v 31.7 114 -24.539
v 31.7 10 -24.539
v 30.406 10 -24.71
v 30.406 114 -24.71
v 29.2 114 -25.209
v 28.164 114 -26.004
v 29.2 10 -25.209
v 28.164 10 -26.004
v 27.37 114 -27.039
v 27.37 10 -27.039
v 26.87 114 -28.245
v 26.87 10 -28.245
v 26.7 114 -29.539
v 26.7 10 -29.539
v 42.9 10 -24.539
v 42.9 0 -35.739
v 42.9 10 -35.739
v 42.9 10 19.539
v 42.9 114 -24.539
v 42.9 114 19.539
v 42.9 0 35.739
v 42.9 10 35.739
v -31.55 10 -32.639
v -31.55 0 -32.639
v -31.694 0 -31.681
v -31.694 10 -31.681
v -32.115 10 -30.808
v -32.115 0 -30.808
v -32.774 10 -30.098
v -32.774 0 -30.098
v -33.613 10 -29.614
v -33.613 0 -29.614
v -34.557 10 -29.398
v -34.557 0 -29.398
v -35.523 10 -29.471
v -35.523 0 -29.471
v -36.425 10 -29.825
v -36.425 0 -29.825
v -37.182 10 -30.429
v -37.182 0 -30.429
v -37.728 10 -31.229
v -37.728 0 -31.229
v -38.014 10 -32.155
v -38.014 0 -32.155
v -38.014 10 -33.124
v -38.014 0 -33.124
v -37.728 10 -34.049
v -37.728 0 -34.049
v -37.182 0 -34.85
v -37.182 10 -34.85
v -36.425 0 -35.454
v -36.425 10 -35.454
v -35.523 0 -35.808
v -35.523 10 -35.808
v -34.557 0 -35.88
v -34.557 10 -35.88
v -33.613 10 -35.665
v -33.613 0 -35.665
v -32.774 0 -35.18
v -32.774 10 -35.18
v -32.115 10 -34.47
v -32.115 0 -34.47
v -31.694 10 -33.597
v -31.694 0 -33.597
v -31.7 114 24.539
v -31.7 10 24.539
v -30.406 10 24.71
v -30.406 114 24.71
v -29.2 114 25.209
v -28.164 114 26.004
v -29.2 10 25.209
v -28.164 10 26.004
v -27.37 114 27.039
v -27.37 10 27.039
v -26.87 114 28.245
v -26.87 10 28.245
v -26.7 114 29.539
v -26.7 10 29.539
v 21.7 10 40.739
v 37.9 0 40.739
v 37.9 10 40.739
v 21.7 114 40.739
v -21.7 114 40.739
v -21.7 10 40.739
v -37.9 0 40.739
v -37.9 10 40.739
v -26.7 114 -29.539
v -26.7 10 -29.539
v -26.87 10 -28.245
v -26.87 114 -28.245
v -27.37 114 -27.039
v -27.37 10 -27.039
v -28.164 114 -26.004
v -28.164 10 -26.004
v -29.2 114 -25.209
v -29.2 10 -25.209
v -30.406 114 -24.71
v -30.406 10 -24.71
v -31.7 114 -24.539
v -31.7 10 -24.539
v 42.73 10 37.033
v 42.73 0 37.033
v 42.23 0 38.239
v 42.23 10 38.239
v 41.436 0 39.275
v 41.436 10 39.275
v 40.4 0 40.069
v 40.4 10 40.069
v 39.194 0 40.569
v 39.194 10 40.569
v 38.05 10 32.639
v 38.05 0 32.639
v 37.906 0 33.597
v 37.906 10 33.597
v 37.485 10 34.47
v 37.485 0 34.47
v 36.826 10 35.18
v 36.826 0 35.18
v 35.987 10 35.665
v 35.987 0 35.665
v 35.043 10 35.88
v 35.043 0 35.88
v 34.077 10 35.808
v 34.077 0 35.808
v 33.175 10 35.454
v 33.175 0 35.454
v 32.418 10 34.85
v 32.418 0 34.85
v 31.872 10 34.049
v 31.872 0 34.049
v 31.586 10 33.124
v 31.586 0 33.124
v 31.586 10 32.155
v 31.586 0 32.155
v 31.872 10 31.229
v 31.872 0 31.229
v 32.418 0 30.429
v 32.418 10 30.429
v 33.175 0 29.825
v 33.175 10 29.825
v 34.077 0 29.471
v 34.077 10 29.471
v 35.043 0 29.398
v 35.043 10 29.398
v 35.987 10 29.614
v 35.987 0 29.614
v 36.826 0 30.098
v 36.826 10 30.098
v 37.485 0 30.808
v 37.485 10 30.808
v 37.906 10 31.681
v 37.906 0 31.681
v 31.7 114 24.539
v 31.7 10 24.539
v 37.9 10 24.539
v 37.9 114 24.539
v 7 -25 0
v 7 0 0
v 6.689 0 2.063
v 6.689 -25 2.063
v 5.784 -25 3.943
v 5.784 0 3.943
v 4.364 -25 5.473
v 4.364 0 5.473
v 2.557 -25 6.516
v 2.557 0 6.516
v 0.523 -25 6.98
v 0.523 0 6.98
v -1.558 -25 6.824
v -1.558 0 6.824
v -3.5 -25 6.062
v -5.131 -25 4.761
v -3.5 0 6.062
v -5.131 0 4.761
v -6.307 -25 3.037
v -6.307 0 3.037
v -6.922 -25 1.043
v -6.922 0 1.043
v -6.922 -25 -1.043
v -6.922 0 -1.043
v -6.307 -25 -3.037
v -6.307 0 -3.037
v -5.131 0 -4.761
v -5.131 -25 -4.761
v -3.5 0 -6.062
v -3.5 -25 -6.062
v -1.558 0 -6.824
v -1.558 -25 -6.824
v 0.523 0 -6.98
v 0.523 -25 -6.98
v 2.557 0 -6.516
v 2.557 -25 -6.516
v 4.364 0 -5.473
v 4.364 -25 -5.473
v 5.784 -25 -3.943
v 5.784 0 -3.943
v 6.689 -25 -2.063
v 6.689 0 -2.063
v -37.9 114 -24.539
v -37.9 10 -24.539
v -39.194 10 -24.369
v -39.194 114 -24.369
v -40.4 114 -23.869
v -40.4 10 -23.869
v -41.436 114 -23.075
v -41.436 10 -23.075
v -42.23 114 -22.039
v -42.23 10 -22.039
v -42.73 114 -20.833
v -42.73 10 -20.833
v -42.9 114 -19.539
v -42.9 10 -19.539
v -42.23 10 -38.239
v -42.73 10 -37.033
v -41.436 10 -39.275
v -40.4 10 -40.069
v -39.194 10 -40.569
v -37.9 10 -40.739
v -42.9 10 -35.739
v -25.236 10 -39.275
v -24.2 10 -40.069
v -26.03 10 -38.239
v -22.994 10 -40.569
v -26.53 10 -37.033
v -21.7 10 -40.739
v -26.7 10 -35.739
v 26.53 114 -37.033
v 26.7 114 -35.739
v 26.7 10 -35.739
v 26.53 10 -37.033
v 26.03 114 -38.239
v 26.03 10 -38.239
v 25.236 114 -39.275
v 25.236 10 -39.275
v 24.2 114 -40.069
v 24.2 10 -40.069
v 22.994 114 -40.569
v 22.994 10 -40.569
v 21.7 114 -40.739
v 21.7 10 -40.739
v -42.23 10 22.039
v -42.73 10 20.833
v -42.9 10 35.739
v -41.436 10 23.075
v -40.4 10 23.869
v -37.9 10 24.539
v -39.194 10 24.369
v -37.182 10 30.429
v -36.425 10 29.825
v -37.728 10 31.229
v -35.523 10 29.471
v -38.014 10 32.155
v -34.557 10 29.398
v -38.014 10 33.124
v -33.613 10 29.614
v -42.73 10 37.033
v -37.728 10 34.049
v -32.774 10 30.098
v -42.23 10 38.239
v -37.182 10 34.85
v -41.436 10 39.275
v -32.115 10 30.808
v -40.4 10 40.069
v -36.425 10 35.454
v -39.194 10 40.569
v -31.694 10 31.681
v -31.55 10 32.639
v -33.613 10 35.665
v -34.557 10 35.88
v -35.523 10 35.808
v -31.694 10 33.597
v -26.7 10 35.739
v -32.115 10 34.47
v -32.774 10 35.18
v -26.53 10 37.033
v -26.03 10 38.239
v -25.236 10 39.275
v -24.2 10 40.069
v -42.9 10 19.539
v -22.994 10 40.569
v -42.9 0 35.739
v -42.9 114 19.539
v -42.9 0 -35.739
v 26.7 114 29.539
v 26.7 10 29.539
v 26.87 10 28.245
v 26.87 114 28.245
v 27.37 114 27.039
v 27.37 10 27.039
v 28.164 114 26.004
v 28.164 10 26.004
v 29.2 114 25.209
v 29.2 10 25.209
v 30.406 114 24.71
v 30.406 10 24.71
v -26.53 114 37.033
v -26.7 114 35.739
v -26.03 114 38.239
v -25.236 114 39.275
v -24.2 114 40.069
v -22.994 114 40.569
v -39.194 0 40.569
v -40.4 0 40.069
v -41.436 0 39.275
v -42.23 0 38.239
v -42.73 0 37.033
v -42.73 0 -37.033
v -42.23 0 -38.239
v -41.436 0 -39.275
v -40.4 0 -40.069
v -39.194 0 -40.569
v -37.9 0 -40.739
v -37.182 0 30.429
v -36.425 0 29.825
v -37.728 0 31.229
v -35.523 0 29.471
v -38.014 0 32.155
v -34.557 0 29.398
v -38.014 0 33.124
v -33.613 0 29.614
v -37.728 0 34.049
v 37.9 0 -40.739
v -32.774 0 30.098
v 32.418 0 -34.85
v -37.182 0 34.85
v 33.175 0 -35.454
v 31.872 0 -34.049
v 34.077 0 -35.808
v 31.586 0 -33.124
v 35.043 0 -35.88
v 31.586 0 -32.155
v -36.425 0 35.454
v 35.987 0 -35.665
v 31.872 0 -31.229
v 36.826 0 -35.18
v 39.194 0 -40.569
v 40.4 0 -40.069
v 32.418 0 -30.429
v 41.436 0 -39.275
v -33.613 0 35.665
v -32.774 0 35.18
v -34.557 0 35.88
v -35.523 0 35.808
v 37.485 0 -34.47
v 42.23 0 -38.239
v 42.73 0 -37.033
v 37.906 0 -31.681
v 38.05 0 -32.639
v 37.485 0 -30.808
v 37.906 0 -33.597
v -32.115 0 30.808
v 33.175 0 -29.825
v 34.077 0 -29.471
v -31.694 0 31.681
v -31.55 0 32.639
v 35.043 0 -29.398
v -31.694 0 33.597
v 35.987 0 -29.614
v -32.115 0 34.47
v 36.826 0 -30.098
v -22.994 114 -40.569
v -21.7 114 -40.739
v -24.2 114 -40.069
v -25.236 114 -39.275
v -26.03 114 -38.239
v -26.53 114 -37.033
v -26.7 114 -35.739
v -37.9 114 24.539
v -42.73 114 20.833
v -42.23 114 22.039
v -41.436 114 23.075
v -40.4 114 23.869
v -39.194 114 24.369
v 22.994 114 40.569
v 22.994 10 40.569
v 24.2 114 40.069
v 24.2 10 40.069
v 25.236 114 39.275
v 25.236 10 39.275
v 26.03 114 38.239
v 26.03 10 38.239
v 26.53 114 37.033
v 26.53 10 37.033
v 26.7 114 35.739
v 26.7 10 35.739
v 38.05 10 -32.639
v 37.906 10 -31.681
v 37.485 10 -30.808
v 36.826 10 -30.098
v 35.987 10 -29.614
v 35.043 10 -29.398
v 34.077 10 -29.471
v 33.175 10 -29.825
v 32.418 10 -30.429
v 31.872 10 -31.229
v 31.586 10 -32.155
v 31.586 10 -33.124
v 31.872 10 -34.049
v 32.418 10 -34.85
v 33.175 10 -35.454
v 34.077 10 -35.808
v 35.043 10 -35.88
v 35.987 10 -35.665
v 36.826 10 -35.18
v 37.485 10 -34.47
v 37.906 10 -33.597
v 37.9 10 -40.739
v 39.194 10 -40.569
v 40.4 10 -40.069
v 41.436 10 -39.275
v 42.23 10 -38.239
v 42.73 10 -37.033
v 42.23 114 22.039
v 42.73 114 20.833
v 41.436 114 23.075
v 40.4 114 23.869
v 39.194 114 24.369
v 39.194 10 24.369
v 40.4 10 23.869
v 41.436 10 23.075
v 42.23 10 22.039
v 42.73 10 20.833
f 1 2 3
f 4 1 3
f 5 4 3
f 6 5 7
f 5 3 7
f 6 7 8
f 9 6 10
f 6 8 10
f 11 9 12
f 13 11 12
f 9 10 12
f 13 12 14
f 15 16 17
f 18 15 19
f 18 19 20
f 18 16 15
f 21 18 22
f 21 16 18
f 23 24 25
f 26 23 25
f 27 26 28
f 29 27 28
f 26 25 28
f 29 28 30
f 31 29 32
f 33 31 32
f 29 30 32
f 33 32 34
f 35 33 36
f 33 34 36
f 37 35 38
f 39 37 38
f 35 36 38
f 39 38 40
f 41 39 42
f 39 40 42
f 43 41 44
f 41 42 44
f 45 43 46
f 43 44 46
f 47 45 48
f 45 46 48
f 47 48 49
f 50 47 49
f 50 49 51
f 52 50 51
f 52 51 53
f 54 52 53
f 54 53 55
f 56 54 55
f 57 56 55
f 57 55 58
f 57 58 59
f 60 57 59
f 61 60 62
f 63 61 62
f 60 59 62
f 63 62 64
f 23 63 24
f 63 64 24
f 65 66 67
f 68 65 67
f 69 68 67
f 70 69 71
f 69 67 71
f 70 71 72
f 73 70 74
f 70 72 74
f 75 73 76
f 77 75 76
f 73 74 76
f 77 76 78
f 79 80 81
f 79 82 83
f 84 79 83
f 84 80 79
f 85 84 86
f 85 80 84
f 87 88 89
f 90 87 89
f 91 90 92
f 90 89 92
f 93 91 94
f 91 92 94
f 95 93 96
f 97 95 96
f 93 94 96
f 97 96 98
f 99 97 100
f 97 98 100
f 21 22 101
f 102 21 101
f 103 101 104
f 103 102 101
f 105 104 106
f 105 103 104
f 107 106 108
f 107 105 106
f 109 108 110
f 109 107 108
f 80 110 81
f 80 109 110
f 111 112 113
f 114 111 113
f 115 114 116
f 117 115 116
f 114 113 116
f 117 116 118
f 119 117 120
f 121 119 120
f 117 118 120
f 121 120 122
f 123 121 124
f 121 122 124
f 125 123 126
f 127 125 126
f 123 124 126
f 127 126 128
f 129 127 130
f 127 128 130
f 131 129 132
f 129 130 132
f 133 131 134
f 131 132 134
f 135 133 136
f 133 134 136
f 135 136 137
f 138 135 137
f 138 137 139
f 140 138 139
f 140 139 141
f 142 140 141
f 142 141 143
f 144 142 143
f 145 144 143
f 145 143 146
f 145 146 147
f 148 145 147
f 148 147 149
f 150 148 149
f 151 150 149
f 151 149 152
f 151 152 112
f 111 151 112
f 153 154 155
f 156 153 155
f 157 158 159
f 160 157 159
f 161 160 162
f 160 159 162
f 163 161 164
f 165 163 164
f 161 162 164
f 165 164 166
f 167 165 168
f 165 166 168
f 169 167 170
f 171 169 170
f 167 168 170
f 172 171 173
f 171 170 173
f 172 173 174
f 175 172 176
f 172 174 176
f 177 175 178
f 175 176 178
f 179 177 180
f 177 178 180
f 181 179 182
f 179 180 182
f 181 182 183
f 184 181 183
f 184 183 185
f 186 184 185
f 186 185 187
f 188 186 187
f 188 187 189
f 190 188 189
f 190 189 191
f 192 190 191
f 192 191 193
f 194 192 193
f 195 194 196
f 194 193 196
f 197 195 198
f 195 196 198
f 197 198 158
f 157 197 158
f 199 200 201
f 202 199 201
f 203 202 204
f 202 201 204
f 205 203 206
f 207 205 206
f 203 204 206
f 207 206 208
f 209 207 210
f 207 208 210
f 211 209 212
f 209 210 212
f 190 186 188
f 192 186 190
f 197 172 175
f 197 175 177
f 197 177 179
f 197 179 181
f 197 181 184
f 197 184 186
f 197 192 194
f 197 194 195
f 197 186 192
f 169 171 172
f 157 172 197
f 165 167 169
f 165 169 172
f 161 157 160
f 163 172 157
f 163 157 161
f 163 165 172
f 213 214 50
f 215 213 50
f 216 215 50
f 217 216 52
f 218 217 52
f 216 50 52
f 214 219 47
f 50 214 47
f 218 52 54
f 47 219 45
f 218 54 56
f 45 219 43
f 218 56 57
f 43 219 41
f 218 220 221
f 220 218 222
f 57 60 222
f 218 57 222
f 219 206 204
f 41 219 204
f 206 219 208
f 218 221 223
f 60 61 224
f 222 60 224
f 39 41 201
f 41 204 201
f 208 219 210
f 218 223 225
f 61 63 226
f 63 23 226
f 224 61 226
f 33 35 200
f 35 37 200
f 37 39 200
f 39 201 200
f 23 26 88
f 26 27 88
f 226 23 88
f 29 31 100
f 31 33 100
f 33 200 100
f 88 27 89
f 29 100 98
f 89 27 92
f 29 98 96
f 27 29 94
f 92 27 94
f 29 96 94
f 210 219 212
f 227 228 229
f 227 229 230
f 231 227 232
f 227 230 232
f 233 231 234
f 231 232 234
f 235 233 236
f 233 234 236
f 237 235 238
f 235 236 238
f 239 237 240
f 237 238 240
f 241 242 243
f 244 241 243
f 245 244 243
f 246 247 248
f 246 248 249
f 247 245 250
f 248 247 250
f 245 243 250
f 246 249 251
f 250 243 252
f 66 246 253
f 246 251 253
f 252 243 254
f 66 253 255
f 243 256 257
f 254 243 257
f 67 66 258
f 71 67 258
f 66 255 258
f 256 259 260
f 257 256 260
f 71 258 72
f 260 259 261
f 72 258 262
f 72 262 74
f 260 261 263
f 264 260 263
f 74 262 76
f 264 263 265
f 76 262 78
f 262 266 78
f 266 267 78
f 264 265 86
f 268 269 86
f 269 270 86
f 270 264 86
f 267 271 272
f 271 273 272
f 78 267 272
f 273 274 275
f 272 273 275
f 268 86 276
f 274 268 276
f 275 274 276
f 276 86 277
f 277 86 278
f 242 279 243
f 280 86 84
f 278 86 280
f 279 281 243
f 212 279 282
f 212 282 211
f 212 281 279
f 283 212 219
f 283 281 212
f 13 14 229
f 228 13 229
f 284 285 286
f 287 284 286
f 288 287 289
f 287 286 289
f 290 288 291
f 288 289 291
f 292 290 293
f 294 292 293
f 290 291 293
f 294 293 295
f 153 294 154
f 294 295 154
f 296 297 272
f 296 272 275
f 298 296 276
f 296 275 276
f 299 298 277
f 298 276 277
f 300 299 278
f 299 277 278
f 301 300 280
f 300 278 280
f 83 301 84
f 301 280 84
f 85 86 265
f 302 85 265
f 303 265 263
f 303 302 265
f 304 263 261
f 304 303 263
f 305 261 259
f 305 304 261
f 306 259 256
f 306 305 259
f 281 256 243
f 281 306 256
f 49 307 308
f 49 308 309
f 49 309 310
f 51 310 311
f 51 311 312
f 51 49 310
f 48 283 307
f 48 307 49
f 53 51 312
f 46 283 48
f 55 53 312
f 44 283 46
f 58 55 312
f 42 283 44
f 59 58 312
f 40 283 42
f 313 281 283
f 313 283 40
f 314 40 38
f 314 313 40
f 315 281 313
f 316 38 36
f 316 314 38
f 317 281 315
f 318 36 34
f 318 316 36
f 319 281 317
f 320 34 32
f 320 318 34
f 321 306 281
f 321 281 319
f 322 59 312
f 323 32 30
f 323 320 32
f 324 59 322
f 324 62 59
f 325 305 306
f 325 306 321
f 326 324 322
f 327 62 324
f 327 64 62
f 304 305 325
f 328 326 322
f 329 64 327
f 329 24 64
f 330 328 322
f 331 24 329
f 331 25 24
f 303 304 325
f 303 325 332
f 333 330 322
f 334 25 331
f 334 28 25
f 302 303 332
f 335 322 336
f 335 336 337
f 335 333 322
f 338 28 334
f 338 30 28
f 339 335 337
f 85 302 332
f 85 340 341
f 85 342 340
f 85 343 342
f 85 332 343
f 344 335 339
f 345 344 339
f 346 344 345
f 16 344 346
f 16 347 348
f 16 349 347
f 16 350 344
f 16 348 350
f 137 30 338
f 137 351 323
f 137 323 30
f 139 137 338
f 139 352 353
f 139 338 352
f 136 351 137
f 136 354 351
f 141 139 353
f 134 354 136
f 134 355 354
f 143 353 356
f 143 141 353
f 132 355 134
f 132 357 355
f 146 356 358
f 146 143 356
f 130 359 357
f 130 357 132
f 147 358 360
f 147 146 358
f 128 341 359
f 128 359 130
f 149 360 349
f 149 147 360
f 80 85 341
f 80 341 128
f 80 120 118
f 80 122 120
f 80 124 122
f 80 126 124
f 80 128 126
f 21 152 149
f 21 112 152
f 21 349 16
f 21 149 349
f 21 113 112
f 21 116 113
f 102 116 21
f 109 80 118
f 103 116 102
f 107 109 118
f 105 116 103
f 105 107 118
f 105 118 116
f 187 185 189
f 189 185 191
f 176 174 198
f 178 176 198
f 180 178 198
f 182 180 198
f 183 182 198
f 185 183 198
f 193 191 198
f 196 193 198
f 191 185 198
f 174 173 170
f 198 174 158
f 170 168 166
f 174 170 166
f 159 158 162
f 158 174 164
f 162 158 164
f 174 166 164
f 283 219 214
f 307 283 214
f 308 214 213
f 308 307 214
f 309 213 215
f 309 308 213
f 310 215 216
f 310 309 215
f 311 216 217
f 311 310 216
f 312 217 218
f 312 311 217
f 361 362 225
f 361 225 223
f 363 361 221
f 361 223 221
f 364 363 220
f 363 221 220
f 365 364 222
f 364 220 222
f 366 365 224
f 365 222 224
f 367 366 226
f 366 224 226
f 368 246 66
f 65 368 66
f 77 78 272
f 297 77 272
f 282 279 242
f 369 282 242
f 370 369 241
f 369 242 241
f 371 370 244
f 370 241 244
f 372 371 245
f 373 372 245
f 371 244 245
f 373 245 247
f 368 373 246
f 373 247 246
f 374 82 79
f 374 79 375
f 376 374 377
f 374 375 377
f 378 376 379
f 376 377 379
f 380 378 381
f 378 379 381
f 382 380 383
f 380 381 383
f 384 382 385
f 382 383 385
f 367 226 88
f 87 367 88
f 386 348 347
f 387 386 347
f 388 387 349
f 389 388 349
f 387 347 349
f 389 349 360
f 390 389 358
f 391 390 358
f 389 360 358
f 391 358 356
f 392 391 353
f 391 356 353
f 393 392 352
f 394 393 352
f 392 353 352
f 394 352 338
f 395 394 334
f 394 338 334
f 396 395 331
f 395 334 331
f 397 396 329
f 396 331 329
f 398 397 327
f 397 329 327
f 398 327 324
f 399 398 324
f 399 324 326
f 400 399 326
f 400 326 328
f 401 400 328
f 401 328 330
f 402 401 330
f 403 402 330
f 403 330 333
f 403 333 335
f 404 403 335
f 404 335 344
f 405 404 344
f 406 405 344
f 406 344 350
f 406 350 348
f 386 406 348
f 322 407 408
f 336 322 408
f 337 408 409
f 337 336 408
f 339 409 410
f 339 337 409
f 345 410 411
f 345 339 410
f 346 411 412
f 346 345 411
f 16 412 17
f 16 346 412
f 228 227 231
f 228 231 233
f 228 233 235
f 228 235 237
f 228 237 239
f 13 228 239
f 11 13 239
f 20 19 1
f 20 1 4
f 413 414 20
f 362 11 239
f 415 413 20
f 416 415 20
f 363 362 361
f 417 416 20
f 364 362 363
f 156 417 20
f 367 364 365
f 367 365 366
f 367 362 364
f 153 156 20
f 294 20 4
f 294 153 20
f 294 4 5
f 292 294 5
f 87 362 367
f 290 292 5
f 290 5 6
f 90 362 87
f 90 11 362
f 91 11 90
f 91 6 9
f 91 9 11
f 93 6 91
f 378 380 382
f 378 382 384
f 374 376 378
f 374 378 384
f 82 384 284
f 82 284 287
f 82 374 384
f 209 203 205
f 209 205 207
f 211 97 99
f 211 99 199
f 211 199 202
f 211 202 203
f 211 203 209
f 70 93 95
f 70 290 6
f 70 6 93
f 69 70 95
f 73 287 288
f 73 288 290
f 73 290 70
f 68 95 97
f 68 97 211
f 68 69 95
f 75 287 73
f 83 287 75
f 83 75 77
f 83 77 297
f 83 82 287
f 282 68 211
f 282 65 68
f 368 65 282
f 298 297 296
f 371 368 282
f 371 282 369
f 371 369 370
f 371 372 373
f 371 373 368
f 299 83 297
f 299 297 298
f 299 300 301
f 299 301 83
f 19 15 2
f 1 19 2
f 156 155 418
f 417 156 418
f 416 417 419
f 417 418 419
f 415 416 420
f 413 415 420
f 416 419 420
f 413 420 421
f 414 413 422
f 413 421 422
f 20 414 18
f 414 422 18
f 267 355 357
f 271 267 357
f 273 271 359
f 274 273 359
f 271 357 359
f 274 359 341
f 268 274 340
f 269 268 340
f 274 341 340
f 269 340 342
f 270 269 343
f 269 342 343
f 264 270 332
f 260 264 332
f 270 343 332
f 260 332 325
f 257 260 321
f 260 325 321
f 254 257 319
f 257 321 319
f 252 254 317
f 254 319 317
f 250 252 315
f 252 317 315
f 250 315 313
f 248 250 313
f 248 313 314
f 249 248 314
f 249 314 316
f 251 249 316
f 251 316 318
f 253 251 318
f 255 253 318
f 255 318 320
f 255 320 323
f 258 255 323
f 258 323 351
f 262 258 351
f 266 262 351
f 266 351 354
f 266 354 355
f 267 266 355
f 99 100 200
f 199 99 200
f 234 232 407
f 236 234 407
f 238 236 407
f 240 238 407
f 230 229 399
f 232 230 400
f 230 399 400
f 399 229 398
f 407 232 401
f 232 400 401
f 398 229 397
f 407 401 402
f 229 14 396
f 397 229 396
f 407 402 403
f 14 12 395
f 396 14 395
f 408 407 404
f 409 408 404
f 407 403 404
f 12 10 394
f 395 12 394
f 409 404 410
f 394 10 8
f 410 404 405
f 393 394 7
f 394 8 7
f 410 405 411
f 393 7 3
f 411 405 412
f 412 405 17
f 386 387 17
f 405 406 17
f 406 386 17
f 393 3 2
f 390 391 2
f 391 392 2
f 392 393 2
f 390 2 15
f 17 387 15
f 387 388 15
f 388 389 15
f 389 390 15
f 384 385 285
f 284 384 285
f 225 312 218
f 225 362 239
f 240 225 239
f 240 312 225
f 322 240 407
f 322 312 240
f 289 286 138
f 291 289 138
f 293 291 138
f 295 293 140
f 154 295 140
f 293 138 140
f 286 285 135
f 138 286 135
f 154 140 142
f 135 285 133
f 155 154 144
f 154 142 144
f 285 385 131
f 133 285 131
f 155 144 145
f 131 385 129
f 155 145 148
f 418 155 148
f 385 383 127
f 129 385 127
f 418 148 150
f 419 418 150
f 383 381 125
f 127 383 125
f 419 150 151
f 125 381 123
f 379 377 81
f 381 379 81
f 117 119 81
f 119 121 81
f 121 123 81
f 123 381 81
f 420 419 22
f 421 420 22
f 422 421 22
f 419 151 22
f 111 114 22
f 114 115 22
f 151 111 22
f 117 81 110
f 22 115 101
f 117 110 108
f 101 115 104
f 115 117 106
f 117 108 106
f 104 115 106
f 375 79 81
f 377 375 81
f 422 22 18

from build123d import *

# Parameters (mm, degrees)
F0_R     = 3.25
F0_R_2   = 30
F0_R_3   = 7
F1_DEPTH = 10
F2_R     = 30
F2_R_2   = 7
F3_DEPTH = 104
F4_DEPTH = 114.001
F5_DEPTH = 25


with BuildPart() as f1:
    # F0 (on Front) → F1 (new body)
    with BuildSketch(Plane.XZ):
        with BuildLine():
            Line((-42.9, 35.739249), (-42.9, 24.539249))
            Line((-42.9, 24.539249), (-26.7, 24.539249))
            Line((-26.7, 24.539249), (-26.7, 40.739249))
            Line((-26.7, 40.739249), (-37.9, 40.739249))
            ThreePointArc((-37.9, 40.739249), (-41.435534, 39.274783), (-42.9, 35.739249))
        make_face()
        with Locations((-34.8, 32.639249)):
            Circle(F0_R, mode=Mode.SUBTRACT)
        with Locations((-34.8, 32.639249)):
            Circle(F0_R)
        Polygon((-26.7, -40.739249), (26.7, -40.739249), (26.7, -24.539249), (42.9, -24.539249), (42.9, 24.539249), (26.7, 24.539249), (26.7, 40.739249), (-26.7, 40.739249), (-26.7, 24.539249), (-42.9, 24.539249), (-42.9, -24.539249), (-26.7, -24.539249), align=None)
        Circle(F0_R_2, mode=Mode.SUBTRACT)
        with BuildLine():
            Line((26.7, 24.539249), (42.9, 24.539249))
            Line((42.9, 24.539249), (42.9, 35.739249))
            ThreePointArc((42.9, 35.739249), (41.435534, 39.274783), (37.9, 40.739249))
            Line((37.9, 40.739249), (26.7, 40.739249))
            Line((26.7, 40.739249), (26.7, 24.539249))
        make_face()
        with Locations((34.8, 32.639249)):
            Circle(F0_R, mode=Mode.SUBTRACT)
        with Locations((34.8, 32.639249)):
            Circle(F0_R)
        Circle(F0_R_2)
        Circle(F0_R_3, mode=Mode.SUBTRACT)
        Circle(F0_R_3)
        with Locations((-34.8, -32.639249)):
            Circle(F0_R)
        with BuildLine():
            Line((-37.9, -40.739249), (-26.7, -40.739249))
            Line((-26.7, -40.739249), (-26.7, -24.539249))
            Line((-26.7, -24.539249), (-42.9, -24.539249))
            Line((-42.9, -24.539249), (-42.9, -35.739249))
            ThreePointArc((-42.9, -35.739249), (-41.435534, -39.274783), (-37.9, -40.739249))
        make_face()
        with Locations((-34.8, -32.639249)):
            Circle(F0_R, mode=Mode.SUBTRACT)
        with BuildLine():
            Line((26.7, -40.739249), (37.9, -40.739249))
            ThreePointArc((37.9, -40.739249), (41.435534, -39.274783), (42.9, -35.739249))
            Line((42.9, -35.739249), (42.9, -24.539249))
            Line((42.9, -24.539249), (26.7, -24.539249))
            Line((26.7, -24.539249), (26.7, -40.739249))
        make_face()
        with Locations((34.8, -32.639249)):
            Circle(F0_R, mode=Mode.SUBTRACT)
        with Locations((34.8, -32.639249)):
            Circle(F0_R)
    extrude(amount=-F1_DEPTH)

    # F2 (on face) → F3 (join)
    with BuildSketch(Plane(origin=(0, 10, 0), x_dir=(-1, 0, 0), z_dir=(0, 1, 0))):
        with BuildLine():
            ThreePointArc((-26.7, -35.739249), (-25.235534, -39.274783), (-21.7, -40.739249))
            Line((-21.7, -40.739249), (21.7, -40.739249))
            ThreePointArc((21.7, -40.739249), (25.235534, -39.274783), (26.7, -35.739249))
            Line((26.7, -35.739249), (26.7, -29.539249))
            ThreePointArc((26.7, -29.539249), (28.164466, -26.003716), (31.7, -24.539249))
            Line((31.7, -24.539249), (37.9, -24.539249))
            ThreePointArc((37.9, -24.539249), (41.435534, -23.074783), (42.9, -19.539249))
            Line((42.9, -19.539249), (42.9, 19.539249))
            ThreePointArc((42.9, 19.539249), (41.435534, 23.074783), (37.9, 24.539249))
            Line((37.9, 24.539249), (31.7, 24.539249))
            ThreePointArc((31.7, 24.539249), (28.164466, 26.003716), (26.7, 29.539249))
            Line((26.7, 29.539249), (26.7, 35.739249))
            ThreePointArc((26.7, 35.739249), (25.235534, 39.274783), (21.7, 40.739249))
            Line((21.7, 40.739249), (-21.7, 40.739249))
            ThreePointArc((-21.7, 40.739249), (-25.235534, 39.274783), (-26.7, 35.739249))
            Line((-26.7, 35.739249), (-26.7, 29.539249))
            ThreePointArc((-26.7, 29.539249), (-28.164466, 26.003716), (-31.7, 24.539249))
            Line((-31.7, 24.539249), (-37.9, 24.539249))
            ThreePointArc((-37.9, 24.539249), (-41.435534, 23.074783), (-42.9, 19.539249))
            Line((-42.9, 19.539249), (-42.9, -24.539249))
            Line((-42.9, -24.539249), (-31.7, -24.539249))
            ThreePointArc((-31.7, -24.539249), (-28.164466, -26.003716), (-26.7, -29.539249))
            Line((-26.7, -29.539249), (-26.7, -35.739249))
        make_face()
        Circle(F2_R, mode=Mode.SUBTRACT)
        Circle(F2_R)
        Circle(F2_R_2, mode=Mode.SUBTRACT)
        Circle(F2_R_2)
    extrude(amount=F3_DEPTH)

    # F0 (on Front) → F4 (cut, through all)
    with BuildSketch(Plane.XZ):
        with Locations((34.8, 32.639249)):
            Circle(F0_R)
        with Locations((-34.8, 32.639249)):
            Circle(F0_R)
        with Locations((-34.8, -32.639249)):
            Circle(F0_R)
        with Locations((34.8, -32.639249)):
            Circle(F0_R)
    extrude(amount=-F4_DEPTH, mode=Mode.SUBTRACT)


with BuildPart() as f5:
    # F0 (on Front) → F5 (new body)
    with BuildSketch(Plane.XZ):
        Circle(F0_R_3)
    extrude(amount=F5_DEPTH)


solid = Compound([f1.part, f5.part])
